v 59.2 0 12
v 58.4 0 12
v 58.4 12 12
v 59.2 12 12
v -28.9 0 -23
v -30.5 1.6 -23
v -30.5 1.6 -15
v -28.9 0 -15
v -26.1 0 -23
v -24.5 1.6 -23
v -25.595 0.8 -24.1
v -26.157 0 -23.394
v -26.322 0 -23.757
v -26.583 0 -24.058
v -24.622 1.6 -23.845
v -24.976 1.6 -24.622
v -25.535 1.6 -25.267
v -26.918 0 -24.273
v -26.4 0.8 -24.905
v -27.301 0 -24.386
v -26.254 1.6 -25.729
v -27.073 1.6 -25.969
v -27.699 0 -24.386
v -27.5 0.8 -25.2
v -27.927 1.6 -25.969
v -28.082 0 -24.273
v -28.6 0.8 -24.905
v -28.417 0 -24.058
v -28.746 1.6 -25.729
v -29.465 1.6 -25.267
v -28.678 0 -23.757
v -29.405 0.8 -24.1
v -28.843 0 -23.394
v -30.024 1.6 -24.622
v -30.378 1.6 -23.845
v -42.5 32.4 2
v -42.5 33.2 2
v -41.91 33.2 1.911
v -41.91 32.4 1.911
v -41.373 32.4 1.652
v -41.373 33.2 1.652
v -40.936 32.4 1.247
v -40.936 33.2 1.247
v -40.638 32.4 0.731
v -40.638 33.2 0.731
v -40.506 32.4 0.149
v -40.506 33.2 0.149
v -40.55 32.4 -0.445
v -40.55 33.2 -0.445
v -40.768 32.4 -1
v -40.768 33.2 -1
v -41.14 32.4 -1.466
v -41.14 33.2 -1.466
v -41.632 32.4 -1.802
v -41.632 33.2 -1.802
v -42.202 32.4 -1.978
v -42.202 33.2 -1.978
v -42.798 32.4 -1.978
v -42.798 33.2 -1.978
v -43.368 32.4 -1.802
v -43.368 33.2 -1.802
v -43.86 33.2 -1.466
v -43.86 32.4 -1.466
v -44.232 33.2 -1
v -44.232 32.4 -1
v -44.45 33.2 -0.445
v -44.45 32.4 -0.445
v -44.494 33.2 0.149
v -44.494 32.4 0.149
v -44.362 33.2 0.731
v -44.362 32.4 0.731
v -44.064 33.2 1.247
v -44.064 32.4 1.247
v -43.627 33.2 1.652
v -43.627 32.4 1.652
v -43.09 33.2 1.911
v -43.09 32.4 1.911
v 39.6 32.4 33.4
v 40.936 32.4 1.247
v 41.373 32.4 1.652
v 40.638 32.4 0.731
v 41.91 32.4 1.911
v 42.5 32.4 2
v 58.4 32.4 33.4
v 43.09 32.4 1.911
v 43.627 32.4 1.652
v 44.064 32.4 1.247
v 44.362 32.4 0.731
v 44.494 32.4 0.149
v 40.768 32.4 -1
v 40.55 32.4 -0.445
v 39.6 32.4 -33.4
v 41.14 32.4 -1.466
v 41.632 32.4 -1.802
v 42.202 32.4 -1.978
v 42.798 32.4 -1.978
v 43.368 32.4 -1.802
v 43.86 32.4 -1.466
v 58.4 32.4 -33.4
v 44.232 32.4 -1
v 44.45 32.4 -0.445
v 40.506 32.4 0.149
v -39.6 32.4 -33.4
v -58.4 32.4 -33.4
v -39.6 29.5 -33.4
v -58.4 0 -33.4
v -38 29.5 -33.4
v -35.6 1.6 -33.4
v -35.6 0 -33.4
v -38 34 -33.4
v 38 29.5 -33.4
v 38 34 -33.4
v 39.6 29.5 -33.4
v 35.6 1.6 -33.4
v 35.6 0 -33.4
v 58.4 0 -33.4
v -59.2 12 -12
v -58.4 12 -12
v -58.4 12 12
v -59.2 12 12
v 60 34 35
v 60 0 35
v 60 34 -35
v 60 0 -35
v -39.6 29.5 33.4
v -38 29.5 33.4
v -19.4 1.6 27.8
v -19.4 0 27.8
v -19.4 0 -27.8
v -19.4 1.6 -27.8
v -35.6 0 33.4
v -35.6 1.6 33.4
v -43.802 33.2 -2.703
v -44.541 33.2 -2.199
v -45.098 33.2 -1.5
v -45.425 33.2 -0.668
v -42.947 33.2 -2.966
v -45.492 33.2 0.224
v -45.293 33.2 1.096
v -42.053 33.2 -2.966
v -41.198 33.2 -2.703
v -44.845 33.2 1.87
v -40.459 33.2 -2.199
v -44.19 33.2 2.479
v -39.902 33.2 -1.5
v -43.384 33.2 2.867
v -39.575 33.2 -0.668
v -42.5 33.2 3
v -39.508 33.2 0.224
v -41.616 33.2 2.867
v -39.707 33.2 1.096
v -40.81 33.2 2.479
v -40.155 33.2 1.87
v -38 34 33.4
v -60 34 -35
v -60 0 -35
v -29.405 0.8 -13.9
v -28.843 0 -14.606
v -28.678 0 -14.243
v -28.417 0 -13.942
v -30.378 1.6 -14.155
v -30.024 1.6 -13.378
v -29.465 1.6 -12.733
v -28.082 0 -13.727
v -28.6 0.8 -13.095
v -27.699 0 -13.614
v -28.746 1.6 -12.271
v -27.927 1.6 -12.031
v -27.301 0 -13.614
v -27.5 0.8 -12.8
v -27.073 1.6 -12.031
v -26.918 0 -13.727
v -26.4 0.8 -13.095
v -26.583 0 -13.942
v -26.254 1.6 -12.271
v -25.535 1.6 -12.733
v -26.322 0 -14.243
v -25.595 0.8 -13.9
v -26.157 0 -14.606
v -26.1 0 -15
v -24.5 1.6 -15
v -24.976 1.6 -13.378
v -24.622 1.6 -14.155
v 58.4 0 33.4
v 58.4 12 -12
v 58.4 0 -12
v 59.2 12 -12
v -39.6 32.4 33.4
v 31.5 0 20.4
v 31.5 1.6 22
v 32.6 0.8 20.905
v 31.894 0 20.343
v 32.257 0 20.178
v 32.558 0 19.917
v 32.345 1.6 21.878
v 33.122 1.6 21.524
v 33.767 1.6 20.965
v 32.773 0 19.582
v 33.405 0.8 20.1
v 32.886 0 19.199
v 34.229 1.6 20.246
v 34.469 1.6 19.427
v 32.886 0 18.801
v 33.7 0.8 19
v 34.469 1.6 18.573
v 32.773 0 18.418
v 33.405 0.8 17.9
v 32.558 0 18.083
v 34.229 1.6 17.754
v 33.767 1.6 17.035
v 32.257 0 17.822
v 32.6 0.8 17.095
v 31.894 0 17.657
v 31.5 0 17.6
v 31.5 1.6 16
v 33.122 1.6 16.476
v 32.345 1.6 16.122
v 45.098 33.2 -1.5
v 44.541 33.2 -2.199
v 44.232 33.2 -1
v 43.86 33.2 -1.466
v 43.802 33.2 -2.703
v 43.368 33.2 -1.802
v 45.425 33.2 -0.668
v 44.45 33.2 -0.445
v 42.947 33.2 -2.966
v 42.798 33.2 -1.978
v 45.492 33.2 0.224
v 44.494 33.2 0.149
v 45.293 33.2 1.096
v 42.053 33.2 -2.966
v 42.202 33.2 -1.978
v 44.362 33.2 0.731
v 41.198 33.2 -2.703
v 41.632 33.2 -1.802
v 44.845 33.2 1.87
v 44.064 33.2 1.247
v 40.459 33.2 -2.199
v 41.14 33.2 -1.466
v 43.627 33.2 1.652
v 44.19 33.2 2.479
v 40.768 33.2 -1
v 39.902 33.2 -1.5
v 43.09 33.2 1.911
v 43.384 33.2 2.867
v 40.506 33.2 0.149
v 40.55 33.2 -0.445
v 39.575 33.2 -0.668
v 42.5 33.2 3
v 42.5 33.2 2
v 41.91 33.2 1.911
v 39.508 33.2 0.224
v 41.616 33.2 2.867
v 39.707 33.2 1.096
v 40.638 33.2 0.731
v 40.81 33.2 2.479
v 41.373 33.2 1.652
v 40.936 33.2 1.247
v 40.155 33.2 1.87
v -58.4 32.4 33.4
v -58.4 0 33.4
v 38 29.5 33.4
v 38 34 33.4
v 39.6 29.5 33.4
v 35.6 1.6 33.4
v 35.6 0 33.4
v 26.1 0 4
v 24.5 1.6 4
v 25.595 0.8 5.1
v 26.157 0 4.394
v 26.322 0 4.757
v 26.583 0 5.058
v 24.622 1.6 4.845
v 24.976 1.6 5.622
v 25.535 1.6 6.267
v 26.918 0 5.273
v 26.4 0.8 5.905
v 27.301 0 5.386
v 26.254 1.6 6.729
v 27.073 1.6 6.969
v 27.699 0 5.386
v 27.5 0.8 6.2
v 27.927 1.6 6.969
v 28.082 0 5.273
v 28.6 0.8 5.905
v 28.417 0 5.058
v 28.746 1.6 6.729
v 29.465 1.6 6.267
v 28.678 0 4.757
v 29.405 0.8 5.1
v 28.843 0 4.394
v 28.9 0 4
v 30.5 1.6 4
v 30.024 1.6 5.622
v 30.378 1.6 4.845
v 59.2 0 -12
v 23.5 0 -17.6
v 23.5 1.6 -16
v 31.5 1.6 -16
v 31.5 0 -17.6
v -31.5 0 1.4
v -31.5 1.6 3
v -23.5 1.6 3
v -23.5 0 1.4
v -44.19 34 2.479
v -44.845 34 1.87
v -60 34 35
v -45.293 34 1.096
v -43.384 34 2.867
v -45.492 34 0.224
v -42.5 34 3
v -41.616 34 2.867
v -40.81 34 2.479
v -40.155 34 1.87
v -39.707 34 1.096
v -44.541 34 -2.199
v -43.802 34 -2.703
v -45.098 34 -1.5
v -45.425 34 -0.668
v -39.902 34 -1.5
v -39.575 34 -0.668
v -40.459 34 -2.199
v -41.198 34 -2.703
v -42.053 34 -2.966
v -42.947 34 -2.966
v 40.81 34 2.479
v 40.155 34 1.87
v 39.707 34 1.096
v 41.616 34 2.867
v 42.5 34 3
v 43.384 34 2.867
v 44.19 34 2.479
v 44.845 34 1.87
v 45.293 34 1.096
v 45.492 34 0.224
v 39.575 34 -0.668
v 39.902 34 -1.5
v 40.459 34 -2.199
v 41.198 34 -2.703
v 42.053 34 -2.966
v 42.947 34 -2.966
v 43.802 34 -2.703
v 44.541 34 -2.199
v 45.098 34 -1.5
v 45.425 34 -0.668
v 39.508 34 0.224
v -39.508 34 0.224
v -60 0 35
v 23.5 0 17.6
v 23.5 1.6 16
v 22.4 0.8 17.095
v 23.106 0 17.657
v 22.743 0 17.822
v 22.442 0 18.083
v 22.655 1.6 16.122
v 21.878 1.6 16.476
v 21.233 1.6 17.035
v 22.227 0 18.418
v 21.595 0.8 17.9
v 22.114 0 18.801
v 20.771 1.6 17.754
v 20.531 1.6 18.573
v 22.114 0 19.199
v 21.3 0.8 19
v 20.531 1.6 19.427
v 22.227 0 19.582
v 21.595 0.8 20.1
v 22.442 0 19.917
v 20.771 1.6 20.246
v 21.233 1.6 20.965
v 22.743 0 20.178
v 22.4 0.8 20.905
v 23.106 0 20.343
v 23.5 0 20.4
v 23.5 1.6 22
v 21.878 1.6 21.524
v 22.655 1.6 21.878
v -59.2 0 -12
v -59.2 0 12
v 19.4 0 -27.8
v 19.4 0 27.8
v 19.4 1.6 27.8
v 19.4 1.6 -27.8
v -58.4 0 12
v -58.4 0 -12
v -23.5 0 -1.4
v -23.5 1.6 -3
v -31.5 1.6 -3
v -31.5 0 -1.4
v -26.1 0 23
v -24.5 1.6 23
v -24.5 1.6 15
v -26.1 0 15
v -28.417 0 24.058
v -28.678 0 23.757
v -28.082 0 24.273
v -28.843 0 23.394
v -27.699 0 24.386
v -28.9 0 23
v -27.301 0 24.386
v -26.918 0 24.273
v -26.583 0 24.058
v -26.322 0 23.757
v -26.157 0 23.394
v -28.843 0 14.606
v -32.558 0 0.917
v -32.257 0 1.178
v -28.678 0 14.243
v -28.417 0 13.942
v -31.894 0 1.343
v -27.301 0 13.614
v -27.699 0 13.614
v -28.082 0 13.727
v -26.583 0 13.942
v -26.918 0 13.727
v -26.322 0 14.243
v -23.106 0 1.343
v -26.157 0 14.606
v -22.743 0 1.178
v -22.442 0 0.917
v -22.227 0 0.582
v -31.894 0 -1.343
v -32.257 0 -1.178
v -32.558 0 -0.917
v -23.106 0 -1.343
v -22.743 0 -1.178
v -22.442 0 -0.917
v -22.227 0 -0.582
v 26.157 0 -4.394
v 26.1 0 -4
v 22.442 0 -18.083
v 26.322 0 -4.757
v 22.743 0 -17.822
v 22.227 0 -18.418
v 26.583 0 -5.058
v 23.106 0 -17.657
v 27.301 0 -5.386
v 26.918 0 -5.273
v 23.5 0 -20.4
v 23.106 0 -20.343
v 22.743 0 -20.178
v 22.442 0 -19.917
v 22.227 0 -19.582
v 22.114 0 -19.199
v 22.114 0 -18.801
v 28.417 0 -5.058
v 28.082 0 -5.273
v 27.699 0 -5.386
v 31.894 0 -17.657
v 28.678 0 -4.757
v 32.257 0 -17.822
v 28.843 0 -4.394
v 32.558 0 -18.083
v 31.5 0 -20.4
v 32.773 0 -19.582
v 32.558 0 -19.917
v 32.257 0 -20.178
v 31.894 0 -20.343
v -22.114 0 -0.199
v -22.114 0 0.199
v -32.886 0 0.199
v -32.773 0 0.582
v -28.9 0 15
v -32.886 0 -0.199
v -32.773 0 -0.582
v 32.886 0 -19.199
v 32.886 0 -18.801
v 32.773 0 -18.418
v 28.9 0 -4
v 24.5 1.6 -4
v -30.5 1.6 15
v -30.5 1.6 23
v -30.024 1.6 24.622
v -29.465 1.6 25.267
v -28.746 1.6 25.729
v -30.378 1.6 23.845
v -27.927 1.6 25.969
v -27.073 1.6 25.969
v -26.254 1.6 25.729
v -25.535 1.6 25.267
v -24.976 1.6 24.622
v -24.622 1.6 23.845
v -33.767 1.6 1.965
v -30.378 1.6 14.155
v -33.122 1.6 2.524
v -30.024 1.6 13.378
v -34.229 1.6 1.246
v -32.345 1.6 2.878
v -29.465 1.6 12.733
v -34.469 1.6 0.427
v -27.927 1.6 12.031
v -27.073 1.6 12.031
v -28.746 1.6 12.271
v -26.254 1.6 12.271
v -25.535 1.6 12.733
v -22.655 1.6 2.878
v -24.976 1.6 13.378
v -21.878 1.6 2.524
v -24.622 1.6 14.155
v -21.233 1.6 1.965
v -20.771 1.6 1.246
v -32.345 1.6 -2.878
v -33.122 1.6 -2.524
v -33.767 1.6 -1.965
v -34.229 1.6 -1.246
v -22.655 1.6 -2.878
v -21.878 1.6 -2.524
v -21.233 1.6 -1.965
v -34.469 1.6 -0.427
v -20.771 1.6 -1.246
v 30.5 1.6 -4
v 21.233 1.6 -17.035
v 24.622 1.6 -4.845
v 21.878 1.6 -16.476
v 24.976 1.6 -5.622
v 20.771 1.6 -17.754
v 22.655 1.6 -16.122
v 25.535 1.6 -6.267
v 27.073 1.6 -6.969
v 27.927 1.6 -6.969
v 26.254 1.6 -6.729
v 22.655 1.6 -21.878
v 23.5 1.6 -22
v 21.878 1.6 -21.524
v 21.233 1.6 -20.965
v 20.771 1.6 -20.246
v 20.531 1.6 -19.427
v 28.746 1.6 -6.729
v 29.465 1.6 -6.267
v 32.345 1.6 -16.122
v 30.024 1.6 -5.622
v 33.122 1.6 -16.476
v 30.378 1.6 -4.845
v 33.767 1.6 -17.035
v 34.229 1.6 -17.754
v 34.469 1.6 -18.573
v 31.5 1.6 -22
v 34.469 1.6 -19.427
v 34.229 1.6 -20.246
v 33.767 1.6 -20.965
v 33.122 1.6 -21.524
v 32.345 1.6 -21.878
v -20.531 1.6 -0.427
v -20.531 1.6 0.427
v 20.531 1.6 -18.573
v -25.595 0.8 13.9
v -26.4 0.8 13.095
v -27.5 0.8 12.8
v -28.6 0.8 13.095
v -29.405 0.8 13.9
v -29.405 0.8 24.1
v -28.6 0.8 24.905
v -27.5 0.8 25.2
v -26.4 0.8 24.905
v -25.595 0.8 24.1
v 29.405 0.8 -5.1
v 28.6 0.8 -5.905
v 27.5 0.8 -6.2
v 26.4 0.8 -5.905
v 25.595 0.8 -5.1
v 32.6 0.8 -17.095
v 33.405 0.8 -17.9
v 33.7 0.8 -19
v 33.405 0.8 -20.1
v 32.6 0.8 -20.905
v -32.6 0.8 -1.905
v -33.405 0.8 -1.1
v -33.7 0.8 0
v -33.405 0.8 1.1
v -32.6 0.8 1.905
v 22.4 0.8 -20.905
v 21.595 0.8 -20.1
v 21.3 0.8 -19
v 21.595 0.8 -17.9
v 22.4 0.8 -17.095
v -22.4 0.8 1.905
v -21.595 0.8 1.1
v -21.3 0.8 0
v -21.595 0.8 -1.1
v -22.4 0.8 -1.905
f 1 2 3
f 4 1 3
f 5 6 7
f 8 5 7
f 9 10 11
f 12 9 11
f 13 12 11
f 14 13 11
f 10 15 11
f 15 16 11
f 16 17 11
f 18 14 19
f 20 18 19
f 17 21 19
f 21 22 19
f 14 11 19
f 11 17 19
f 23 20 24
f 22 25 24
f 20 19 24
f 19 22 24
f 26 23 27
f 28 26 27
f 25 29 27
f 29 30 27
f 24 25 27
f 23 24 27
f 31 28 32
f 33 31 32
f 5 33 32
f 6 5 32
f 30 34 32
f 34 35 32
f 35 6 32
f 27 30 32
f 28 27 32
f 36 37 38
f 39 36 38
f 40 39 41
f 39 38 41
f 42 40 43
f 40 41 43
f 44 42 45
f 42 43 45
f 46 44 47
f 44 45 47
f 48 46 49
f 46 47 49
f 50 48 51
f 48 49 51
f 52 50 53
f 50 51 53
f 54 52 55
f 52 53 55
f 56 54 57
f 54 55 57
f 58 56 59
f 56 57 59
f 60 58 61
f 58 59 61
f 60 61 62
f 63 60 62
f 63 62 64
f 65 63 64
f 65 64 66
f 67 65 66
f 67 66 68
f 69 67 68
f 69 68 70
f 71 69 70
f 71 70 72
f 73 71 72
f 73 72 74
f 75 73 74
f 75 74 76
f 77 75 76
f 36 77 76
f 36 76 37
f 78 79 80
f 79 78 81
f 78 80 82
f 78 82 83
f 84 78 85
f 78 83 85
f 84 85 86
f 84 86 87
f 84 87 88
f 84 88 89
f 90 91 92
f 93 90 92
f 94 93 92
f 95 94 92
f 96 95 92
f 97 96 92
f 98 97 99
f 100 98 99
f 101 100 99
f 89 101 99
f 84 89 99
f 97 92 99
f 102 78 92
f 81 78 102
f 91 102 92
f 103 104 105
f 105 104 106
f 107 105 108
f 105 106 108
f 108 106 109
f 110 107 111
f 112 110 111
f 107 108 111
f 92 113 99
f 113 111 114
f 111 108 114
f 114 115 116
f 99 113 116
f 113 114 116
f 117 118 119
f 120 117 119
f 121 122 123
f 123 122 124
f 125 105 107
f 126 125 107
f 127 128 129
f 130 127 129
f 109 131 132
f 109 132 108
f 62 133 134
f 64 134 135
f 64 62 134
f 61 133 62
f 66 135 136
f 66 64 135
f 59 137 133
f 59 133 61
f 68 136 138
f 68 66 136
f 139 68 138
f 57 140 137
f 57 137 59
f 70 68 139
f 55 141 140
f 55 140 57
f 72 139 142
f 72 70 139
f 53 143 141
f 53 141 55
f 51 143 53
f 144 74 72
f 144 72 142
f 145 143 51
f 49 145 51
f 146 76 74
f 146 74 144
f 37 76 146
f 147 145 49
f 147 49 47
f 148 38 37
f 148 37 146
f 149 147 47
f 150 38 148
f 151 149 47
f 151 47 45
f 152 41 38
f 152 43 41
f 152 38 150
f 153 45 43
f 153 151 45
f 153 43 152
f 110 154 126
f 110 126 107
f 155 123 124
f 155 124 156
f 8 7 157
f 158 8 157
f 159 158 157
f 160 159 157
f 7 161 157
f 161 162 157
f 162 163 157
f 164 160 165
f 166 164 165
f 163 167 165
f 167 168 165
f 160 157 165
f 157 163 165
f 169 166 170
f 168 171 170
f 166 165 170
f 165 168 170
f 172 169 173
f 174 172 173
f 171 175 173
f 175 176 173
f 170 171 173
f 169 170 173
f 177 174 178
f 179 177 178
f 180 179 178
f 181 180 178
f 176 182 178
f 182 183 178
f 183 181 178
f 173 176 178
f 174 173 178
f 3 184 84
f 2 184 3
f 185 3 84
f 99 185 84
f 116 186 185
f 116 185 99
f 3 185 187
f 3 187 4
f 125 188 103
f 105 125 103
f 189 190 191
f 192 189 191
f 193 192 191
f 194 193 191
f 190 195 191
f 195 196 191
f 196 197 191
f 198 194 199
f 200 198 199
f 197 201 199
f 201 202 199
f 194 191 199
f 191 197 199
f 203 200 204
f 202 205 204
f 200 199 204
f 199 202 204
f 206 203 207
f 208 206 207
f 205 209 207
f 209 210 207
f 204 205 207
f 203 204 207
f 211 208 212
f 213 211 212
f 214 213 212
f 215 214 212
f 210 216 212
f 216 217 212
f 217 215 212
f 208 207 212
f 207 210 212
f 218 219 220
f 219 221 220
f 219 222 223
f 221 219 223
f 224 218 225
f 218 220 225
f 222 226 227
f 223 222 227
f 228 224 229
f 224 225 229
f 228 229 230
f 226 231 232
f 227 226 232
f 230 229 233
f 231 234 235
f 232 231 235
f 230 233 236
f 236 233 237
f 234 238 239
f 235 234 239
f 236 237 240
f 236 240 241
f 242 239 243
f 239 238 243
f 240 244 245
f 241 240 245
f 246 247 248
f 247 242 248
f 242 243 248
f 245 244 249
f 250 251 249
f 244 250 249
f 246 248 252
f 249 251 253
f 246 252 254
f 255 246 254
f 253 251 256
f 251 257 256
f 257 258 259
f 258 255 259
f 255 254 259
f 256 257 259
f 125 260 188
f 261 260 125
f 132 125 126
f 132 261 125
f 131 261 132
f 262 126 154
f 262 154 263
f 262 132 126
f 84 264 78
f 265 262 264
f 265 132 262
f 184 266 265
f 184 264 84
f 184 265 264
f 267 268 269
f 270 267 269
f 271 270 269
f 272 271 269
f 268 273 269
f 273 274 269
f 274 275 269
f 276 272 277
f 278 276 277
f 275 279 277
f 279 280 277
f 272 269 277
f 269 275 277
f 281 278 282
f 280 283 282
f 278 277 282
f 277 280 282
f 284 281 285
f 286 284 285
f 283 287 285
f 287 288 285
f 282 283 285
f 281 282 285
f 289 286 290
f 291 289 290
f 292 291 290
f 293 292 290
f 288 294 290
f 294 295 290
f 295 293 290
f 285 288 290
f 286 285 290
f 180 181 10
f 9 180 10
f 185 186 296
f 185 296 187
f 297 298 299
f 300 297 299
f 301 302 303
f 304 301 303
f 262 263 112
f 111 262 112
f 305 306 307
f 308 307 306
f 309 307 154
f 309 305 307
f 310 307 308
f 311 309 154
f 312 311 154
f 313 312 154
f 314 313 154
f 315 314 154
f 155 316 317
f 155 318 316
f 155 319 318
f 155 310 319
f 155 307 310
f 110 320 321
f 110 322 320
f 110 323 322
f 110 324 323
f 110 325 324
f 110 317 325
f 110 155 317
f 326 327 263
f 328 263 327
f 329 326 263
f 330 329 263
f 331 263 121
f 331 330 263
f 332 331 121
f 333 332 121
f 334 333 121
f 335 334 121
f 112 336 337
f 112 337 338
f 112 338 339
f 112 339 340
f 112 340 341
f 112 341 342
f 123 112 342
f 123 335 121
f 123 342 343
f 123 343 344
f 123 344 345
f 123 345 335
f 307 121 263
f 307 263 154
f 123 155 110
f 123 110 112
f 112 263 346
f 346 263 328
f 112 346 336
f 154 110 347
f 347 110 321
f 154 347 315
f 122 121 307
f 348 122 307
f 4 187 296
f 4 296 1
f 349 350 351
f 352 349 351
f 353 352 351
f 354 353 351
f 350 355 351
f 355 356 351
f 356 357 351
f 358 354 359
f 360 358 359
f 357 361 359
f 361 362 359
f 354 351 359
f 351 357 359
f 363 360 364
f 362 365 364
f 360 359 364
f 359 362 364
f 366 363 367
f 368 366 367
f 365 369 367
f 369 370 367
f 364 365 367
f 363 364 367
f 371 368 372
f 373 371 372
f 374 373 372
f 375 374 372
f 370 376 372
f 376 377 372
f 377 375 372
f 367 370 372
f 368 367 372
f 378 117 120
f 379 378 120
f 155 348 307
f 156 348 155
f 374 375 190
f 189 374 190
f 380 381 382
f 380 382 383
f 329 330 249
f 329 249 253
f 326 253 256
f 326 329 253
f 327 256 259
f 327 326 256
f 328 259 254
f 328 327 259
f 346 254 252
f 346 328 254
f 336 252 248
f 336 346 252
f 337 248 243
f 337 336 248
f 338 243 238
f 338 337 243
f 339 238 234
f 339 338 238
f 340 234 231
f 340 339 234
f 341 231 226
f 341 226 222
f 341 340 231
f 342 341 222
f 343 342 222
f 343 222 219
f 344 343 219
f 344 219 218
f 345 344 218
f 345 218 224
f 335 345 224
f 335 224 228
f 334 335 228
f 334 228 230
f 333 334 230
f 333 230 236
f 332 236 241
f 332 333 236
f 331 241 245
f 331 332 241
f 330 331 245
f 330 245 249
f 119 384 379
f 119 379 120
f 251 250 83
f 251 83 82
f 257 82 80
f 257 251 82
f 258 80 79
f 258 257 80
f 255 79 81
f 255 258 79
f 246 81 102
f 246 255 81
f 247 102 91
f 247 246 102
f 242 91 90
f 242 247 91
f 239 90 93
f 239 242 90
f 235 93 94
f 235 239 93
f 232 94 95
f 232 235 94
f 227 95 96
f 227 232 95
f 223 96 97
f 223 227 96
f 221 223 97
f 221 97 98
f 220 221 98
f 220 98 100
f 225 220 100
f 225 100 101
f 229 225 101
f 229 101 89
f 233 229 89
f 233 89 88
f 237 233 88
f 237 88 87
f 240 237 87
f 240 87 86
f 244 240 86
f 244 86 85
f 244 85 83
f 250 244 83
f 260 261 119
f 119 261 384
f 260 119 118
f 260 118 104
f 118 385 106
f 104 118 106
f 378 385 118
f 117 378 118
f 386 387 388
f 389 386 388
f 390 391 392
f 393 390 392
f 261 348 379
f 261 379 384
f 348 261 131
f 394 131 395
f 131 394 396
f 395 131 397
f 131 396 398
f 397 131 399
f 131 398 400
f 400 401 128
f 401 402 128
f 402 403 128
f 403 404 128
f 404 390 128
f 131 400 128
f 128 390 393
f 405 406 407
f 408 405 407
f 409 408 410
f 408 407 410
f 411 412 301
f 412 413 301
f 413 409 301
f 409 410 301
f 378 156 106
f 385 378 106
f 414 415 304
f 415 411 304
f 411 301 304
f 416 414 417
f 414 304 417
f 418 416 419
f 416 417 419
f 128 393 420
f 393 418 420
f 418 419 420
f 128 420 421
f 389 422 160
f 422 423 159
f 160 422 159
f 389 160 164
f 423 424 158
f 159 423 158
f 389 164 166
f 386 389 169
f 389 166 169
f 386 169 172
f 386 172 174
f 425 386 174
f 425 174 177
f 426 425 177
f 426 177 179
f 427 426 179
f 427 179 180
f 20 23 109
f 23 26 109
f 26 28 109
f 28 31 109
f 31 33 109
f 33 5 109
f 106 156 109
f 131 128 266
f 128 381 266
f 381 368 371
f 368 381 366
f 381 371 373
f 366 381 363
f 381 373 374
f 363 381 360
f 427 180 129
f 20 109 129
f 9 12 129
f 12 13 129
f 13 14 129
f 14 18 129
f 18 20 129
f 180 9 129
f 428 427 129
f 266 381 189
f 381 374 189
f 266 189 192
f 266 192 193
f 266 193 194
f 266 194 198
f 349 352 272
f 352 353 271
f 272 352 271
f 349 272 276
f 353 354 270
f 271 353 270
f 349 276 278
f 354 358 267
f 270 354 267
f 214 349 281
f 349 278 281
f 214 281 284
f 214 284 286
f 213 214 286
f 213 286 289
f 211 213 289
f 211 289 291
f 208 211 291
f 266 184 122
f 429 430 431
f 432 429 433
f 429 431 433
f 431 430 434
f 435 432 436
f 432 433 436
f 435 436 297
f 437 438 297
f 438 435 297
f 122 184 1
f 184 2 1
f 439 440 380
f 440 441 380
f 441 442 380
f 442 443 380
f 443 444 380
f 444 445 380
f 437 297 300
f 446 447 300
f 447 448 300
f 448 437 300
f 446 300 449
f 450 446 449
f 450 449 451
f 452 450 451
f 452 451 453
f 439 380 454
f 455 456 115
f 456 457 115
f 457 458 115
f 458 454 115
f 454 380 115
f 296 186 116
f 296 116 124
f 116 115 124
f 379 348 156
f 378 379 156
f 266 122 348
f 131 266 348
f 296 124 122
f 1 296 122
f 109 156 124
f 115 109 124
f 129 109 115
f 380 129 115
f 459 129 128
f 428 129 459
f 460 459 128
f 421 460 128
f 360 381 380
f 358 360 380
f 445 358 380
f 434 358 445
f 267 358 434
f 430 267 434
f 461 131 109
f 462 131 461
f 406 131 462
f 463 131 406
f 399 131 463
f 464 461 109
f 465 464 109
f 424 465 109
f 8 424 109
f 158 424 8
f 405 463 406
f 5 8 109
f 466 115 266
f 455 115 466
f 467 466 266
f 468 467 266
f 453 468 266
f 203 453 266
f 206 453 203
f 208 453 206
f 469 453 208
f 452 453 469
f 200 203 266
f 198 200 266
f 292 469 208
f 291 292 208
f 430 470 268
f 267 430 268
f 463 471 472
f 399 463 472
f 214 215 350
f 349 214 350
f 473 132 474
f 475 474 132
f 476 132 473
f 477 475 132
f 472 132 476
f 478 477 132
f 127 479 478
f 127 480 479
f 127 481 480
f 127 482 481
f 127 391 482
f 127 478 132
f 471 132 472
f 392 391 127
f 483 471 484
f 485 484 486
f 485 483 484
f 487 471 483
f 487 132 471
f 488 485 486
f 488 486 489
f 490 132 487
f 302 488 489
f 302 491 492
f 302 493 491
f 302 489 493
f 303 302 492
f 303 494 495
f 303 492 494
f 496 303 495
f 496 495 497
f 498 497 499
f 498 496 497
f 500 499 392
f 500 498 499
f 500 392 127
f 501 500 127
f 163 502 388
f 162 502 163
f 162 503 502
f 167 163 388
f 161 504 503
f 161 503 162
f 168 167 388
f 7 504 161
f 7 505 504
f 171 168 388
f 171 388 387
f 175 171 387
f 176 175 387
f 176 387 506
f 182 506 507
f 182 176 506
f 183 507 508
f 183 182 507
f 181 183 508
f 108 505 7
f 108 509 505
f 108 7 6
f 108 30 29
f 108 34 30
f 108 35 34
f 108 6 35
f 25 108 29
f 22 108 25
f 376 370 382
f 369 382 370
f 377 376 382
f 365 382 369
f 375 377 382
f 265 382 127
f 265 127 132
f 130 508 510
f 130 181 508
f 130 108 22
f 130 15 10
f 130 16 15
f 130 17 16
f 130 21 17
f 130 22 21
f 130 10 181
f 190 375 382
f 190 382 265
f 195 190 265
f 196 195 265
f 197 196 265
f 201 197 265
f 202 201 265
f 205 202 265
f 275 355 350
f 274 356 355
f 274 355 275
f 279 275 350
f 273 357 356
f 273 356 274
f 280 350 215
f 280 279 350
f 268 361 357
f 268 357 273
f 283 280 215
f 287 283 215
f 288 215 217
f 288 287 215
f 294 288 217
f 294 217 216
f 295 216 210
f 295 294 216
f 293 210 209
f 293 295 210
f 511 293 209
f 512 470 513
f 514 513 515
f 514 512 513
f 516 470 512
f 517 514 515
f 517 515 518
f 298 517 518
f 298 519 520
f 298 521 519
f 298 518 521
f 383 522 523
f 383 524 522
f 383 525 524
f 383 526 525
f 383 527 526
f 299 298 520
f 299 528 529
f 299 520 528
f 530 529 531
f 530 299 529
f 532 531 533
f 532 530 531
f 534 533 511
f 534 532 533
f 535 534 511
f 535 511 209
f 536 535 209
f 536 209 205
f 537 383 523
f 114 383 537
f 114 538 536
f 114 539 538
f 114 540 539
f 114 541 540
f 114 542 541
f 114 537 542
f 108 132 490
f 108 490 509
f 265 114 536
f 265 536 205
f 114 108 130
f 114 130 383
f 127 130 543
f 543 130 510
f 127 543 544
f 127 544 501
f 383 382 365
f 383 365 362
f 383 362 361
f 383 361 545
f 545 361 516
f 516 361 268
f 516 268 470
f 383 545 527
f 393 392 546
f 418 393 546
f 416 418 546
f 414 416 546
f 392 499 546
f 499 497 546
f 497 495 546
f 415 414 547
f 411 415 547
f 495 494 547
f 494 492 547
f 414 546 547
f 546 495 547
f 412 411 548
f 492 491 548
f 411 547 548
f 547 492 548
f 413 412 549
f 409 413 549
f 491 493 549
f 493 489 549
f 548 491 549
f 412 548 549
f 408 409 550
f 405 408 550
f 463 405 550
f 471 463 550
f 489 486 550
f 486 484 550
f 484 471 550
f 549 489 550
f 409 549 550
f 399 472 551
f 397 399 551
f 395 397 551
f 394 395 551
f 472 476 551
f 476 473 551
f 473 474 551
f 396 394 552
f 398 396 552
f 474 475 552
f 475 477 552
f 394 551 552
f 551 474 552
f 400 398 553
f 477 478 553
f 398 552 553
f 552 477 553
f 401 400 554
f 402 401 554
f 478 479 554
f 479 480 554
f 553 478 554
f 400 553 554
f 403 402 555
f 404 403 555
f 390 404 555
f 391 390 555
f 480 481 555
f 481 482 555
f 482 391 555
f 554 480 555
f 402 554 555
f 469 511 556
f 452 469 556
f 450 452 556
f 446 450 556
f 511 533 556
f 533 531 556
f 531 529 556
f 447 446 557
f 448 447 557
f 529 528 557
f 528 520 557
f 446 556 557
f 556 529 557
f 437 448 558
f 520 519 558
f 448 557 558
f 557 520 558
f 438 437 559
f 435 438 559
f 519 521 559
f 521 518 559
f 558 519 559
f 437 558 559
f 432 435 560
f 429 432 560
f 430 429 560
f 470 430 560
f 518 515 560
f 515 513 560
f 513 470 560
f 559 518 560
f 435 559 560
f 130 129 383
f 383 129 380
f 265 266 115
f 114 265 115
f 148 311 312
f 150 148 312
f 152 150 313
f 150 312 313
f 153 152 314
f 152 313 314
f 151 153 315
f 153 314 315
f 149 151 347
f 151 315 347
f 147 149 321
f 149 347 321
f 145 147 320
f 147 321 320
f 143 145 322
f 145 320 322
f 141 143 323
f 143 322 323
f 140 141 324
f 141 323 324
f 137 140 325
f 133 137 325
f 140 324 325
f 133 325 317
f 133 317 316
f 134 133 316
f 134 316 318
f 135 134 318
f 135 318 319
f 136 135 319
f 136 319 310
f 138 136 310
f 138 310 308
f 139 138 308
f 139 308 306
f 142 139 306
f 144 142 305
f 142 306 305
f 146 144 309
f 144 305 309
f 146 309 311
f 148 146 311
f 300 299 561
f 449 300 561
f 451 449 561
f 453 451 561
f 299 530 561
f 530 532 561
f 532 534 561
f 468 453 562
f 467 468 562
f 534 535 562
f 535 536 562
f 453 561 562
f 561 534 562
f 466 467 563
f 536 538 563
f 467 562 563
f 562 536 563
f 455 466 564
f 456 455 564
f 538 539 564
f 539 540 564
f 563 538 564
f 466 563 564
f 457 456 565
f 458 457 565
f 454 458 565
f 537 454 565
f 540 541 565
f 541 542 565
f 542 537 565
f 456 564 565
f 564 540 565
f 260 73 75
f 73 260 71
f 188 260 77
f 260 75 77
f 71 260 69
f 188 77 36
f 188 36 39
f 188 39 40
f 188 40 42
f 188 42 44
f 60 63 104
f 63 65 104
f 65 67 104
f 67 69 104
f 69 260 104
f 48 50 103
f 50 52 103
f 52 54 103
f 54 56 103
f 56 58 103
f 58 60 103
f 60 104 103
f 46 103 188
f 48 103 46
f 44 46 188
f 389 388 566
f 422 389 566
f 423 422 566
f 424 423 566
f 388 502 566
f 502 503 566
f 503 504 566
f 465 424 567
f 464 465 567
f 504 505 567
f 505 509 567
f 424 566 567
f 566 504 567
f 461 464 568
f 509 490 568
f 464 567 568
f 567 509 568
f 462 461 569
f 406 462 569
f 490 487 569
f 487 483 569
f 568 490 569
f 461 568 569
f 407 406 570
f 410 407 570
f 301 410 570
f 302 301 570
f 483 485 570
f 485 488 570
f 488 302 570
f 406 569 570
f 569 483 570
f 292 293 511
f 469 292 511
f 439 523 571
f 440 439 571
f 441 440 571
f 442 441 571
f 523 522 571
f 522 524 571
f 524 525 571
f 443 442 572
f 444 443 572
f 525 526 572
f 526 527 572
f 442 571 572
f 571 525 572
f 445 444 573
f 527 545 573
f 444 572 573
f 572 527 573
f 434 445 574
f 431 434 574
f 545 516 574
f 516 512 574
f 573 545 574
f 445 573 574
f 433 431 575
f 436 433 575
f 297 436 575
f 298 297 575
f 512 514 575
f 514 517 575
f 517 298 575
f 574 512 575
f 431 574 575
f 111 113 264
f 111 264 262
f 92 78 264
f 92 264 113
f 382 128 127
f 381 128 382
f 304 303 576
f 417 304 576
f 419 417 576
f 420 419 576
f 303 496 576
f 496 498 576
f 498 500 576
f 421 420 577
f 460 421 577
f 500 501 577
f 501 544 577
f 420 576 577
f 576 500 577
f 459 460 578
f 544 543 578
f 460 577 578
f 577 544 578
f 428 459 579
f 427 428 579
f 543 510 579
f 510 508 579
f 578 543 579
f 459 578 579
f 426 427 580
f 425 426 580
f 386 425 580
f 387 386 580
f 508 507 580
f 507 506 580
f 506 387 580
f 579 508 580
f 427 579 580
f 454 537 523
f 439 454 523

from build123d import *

# Parameters (mm, degrees)
SKETCH1_W                    = 120
SKETCH1_H                    = 70
BOSS_EXTRUDE1_DEPTH          = 34
SHELL1_T                     = -1.6
CUT_EXTRUDE1_REACH           = 79.337
SKETCH2_W                    = 76
SKETCH2_H                    = 66.8
SKETCH3_W                    = 1.6
SKETCH3_H                    = 70
BOSS_EXTRUDE2_DEPTH          = 4.5
SKETCH4_R                    = 3
CUT_EXTRUDE2_DEPTH           = 0.8
CUT_EXTRUDE3_REACH           = 79.337
SKETCH5_R                    = 2
SKETCH7_W                    = 71.2
SKETCH7_H                    = 66.8
SKETCH7_W_2                  = 38.8
SKETCH7_H_2                  = 55.6
BOSS_EXTRUDE3_DEPTH          = 1.6
CUT_EXTRUDE4_DEPTH           = 1.6
CUT_EXTRUDE4_DRAFT           = -45
CUT_EXTRUDE4_PROFILE_2_DEPTH = 1.6
CUT_EXTRUDE4_PROFILE_2_DRAFT = -45
CUT_EXTRUDE4_PROFILE_3_DEPTH = 1.6
CUT_EXTRUDE4_PROFILE_3_DRAFT = -45
CUT_EXTRUDE4_PROFILE_4_DEPTH = 1.6
CUT_EXTRUDE4_PROFILE_4_DRAFT = -45
CUT_EXTRUDE4_PROFILE_5_DEPTH = 1.6
CUT_EXTRUDE4_PROFILE_5_DRAFT = -45
CUT_EXTRUDE4_PROFILE_6_DEPTH = 1.6
CUT_EXTRUDE4_PROFILE_6_DRAFT = -45
CUT_EXTRUDE5_START           = -1.6
SKETCH9_W                    = 24
SKETCH9_H                    = 12
CUT_EXTRUDE5_DEPTH           = 0.8


with BuildPart() as part:
    # Sketch1 → Boss-Extrude1 (new body)
    with BuildSketch(Plane(origin=(0, 0, 0), x_dir=(1, 0, 0), z_dir=(0, 1, 0))):
        Rectangle(SKETCH1_W, SKETCH1_H)
    extrude(amount=BOSS_EXTRUDE1_DEPTH)

    # Shell1
    shell1_openings = [part.faces().sort_by_distance(p)[0] for p in [
        (0, 0, 0),
    ]]
    offset(amount=SHELL1_T, openings=shell1_openings, kind=Kind.INTERSECTION)

    # Sketch2 → Cut-Extrude1 (cut, up to next)
    with BuildSketch(Plane(origin=(0, 34, 0), x_dir=(1, 0, 0), z_dir=(0, 1, 0)), mode=Mode.PRIVATE) as cut_extrude1_sk1:
        Rectangle(SKETCH2_W, SKETCH2_H)
    cut_extrude1_tool1 = extrude(cut_extrude1_sk1.sketch, amount=-CUT_EXTRUDE1_REACH, mode=Mode.PRIVATE) & part.part
    add(cut_extrude1_tool1.solids().sort_by_distance((0, 34, 0))[0], mode=Mode.SUBTRACT)

    # Sketch3 → Boss-Extrude2 (add)
    with BuildSketch(Plane(origin=(0, 34, 0), x_dir=(1, 0, 0), z_dir=(0, 1, 0))):
        with Locations((-38.8, 0)):
            Rectangle(SKETCH3_W, SKETCH3_H)
    boss_extrude2 = extrude(amount=-BOSS_EXTRUDE2_DEPTH)

    # Sketch4 → Cut-Extrude2 (cut)
    with BuildSketch(Plane(origin=(0, 34, 0), x_dir=(1, 0, 0), z_dir=(0, 1, 0))):
        with Locations(Location((-42.5, 0, 0), (0, 0, 270))):
            Circle(SKETCH4_R)
    cut_extrude2 = extrude(amount=-CUT_EXTRUDE2_DEPTH, mode=Mode.SUBTRACT)

    # Sketch5 → Cut-Extrude3 (cut, up to next)
    with BuildSketch(Plane(origin=(0, 34, 0), x_dir=(1, 0, 0), z_dir=(0, 1, 0)), mode=Mode.PRIVATE) as cut_extrude3_sk1:
        with Locations(Location((-42.5, 0, 0), (0, 0, 270))):
            Circle(SKETCH5_R)
    cut_extrude3_tool1 = extrude(cut_extrude3_sk1.sketch, amount=-CUT_EXTRUDE3_REACH, mode=Mode.PRIVATE) & part.part
    cut_extrude3 = cut_extrude3_tool1.solids().sort_by_distance((-42.5, 34, 0))[0]
    add(cut_extrude3, mode=Mode.SUBTRACT)

    # Mirror1: Boss-Extrude2, Cut-Extrude2, Cut-Extrude3 across plane
    add(boss_extrude2.mirror(Plane(origin=(0, 0, 0), x_dir=(0, 0, 1), z_dir=(1, 0, 0))))
    add(cut_extrude2.mirror(Plane(origin=(0, 0, 0), x_dir=(0, 0, 1), z_dir=(1, 0, 0))), mode=Mode.SUBTRACT)
    add(cut_extrude3.mirror(Plane(origin=(0, 0, 0), x_dir=(0, 0, 1), z_dir=(1, 0, 0))), mode=Mode.SUBTRACT)

    # Sketch7 → Boss-Extrude3 (add)
    with BuildSketch(Plane(origin=(0, 0, 0), x_dir=(1, 0, 0), z_dir=(0, 1, 0))):
        Rectangle(SKETCH7_W, SKETCH7_H)
        Rectangle(SKETCH7_W_2, SKETCH7_H_2, mode=Mode.SUBTRACT)
    extrude(amount=BOSS_EXTRUDE3_DEPTH)


with BuildPart() as cut_extrude4_tool:
    # Sketch8 → Cut-Extrude4 (with draft: the straight prism first)
    with BuildSketch(Plane(origin=(0, 1.6, 0), x_dir=(1, 0, 0), z_dir=(0, 1, 0))):
        with BuildLine():
            ThreePointArc((-31.5, 3), (-34.5, 0), (-31.5, -3))
            Line((-31.5, -3), (-23.5, -3))
            ThreePointArc((-23.5, -3), (-20.5, 0), (-23.5, 3))
            Line((-23.5, 3), (-31.5, 3))
        make_face()
    extrude(amount=-CUT_EXTRUDE4_DEPTH)
    # Cut-Extrude4: the draft: its side faces are tilted about the plane it starts from
    cut_extrude4_sides = [cut_extrude4_tool.faces().sort_by_distance(p)[0] for p in [
        (-20.5, 0.8, 0),
        (-27.5, 0.8, -3),
        (-34.5, 0.8, 0),
        (-27.5, 0.8, 3),
    ]]
    draft(cut_extrude4_sides, Plane(origin=(0, 1.6, 0), x_dir=(1, 0, 0), z_dir=(0, 1, 0)), CUT_EXTRUDE4_DRAFT)


with BuildPart() as part_1:
    add(part.part)

    # Cut-Extrude4: cut by cut_extrude4_tool
    add(cut_extrude4_tool.part, mode=Mode.SUBTRACT)


with BuildPart() as cut_extrude4_profile_2_tool:
    # Sketch8 → Cut-Extrude4 profile 2 (with draft: the straight prism first)
    with BuildSketch(Plane(origin=(0, 1.6, 0), x_dir=(1, 0, 0), z_dir=(0, 1, 0))):
        with BuildLine():
            ThreePointArc((24.5, -4), (27.5, -7), (30.5, -4))
            Line((30.5, -4), (30.5, 4))
            ThreePointArc((30.5, 4), (27.5, 7), (24.5, 4))
            Line((24.5, 4), (24.5, -4))
        make_face()
    extrude(amount=-CUT_EXTRUDE4_PROFILE_2_DEPTH)
    # Cut-Extrude4 profile 2: the draft: its side faces are tilted about the plane it starts from
    cut_extrude4_profile_2_sides = [cut_extrude4_profile_2_tool.faces().sort_by_distance(p)[0] for p in [
        (27.5, 0.8, -7),
        (24.5, 0.8, 0),
        (27.5, 0.8, 7),
        (30.5, 0.8, 0),
    ]]
    draft(cut_extrude4_profile_2_sides, Plane(origin=(0, 1.6, 0), x_dir=(1, 0, 0), z_dir=(0, 1, 0)), CUT_EXTRUDE4_PROFILE_2_DRAFT)


with BuildPart() as part_2:
    add(part_1.part)

    # Cut-Extrude4 profile 2: cut by cut_extrude4_profile_2_tool
    add(cut_extrude4_profile_2_tool.part, mode=Mode.SUBTRACT)


with BuildPart() as cut_extrude4_profile_3_tool:
    # Sketch8 → Cut-Extrude4 profile 3 (with draft: the straight prism first)
    with BuildSketch(Plane(origin=(0, 1.6, 0), x_dir=(1, 0, 0), z_dir=(0, 1, 0))):
        with BuildLine():
            ThreePointArc((23.5, 22), (20.5, 19), (23.5, 16))
            Line((23.5, 16), (31.5, 16))
            ThreePointArc((31.5, 16), (34.5, 19), (31.5, 22))
            Line((31.5, 22), (23.5, 22))
        make_face()
    extrude(amount=-CUT_EXTRUDE4_PROFILE_3_DEPTH)
    # Cut-Extrude4 profile 3: the draft: its side faces are tilted about the plane it starts from
    cut_extrude4_profile_3_sides = [cut_extrude4_profile_3_tool.faces().sort_by_distance(p)[0] for p in [
        (34.5, 0.8, -19),
        (27.5, 0.8, -22),
        (20.5, 0.8, -19),
        (27.5, 0.8, -16),
    ]]
    draft(cut_extrude4_profile_3_sides, Plane(origin=(0, 1.6, 0), x_dir=(1, 0, 0), z_dir=(0, 1, 0)), CUT_EXTRUDE4_PROFILE_3_DRAFT)


with BuildPart() as part_3:
    add(part_2.part)

    # Cut-Extrude4 profile 3: cut by cut_extrude4_profile_3_tool
    add(cut_extrude4_profile_3_tool.part, mode=Mode.SUBTRACT)


with BuildPart() as cut_extrude4_profile_4_tool:
    # Sketch8 → Cut-Extrude4 profile 4 (with draft: the straight prism first)
    with BuildSketch(Plane(origin=(0, 1.6, 0), x_dir=(1, 0, 0), z_dir=(0, 1, 0))):
        with BuildLine():
            ThreePointArc((23.5, -16), (20.5, -19), (23.5, -22))
            Line((23.5, -22), (31.5, -22))
            ThreePointArc((31.5, -22), (34.5, -19), (31.5, -16))
            Line((31.5, -16), (23.5, -16))
        make_face()
    extrude(amount=-CUT_EXTRUDE4_PROFILE_4_DEPTH)
    # Cut-Extrude4 profile 4: the draft: its side faces are tilted about the plane it starts from
    cut_extrude4_profile_4_sides = [cut_extrude4_profile_4_tool.faces().sort_by_distance(p)[0] for p in [
        (34.5, 0.8, 19),
        (27.5, 0.8, 16),
        (20.5, 0.8, 19),
        (27.5, 0.8, 22),
    ]]
    draft(cut_extrude4_profile_4_sides, Plane(origin=(0, 1.6, 0), x_dir=(1, 0, 0), z_dir=(0, 1, 0)), CUT_EXTRUDE4_PROFILE_4_DRAFT)


with BuildPart() as part_4:
    add(part_3.part)

    # Cut-Extrude4 profile 4: cut by cut_extrude4_profile_4_tool
    add(cut_extrude4_profile_4_tool.part, mode=Mode.SUBTRACT)


with BuildPart() as cut_extrude4_profile_5_tool:
    # Sketch8 → Cut-Extrude4 profile 5 (with draft: the straight prism first)
    with BuildSketch(Plane(origin=(0, 1.6, 0), x_dir=(1, 0, 0), z_dir=(0, 1, 0))):
        with BuildLine():
            ThreePointArc((-30.5, 15), (-27.5, 12), (-24.5, 15))
            Line((-24.5, 15), (-24.5, 23))
            ThreePointArc((-24.5, 23), (-27.5, 26), (-30.5, 23))
            Line((-30.5, 23), (-30.5, 15))
        make_face()
    extrude(amount=-CUT_EXTRUDE4_PROFILE_5_DEPTH)
    # Cut-Extrude4 profile 5: the draft: its side faces are tilted about the plane it starts from
    cut_extrude4_profile_5_sides = [cut_extrude4_profile_5_tool.faces().sort_by_distance(p)[0] for p in [
        (-24.5, 0.8, -19),
        (-27.5, 0.8, -26),
        (-30.5, 0.8, -19),
        (-27.5, 0.8, -12),
    ]]
    draft(cut_extrude4_profile_5_sides, Plane(origin=(0, 1.6, 0), x_dir=(1, 0, 0), z_dir=(0, 1, 0)), CUT_EXTRUDE4_PROFILE_5_DRAFT)


with BuildPart() as part_5:
    add(part_4.part)

    # Cut-Extrude4 profile 5: cut by cut_extrude4_profile_5_tool
    add(cut_extrude4_profile_5_tool.part, mode=Mode.SUBTRACT)


with BuildPart() as cut_extrude4_profile_6_tool:
    # Sketch8 → Cut-Extrude4 profile 6 (with draft: the straight prism first)
    with BuildSketch(Plane(origin=(0, 1.6, 0), x_dir=(1, 0, 0), z_dir=(0, 1, 0))):
        with BuildLine():
            ThreePointArc((-30.5, -23), (-27.5, -26), (-24.5, -23))
            Line((-24.5, -23), (-24.5, -15))
            ThreePointArc((-24.5, -15), (-27.5, -12), (-30.5, -15))
            Line((-30.5, -15), (-30.5, -23))
        make_face()
    extrude(amount=-CUT_EXTRUDE4_PROFILE_6_DEPTH)
    # Cut-Extrude4 profile 6: the draft: its side faces are tilted about the plane it starts from
    cut_extrude4_profile_6_sides = [cut_extrude4_profile_6_tool.faces().sort_by_distance(p)[0] for p in [
        (-27.5, 0.8, 26),
        (-24.5, 0.8, 19),
        (-27.5, 0.8, 12),
        (-30.5, 0.8, 19),
    ]]
    draft(cut_extrude4_profile_6_sides, Plane(origin=(0, 1.6, 0), x_dir=(1, 0, 0), z_dir=(0, 1, 0)), CUT_EXTRUDE4_PROFILE_6_DRAFT)


with BuildPart() as part_6:
    add(part_5.part)

    # Cut-Extrude4 profile 6: cut by cut_extrude4_profile_6_tool
    add(cut_extrude4_profile_6_tool.part, mode=Mode.SUBTRACT)

    # Sketch9 → Cut-Extrude5 (cut)
    with BuildSketch(Plane.ZY.offset(60).offset(CUT_EXTRUDE5_START)):
        with Locations((0, 6)):
            Rectangle(SKETCH9_W, SKETCH9_H)
    cut_extrude5 = extrude(amount=CUT_EXTRUDE5_DEPTH, mode=Mode.SUBTRACT)

    # Mirror2: Cut-Extrude5 across plane
    add(cut_extrude5.mirror(Plane(origin=(0, 0, 0), x_dir=(0, 0, 1), z_dir=(1, 0, 0))), mode=Mode.SUBTRACT)


solid = part_6.part
